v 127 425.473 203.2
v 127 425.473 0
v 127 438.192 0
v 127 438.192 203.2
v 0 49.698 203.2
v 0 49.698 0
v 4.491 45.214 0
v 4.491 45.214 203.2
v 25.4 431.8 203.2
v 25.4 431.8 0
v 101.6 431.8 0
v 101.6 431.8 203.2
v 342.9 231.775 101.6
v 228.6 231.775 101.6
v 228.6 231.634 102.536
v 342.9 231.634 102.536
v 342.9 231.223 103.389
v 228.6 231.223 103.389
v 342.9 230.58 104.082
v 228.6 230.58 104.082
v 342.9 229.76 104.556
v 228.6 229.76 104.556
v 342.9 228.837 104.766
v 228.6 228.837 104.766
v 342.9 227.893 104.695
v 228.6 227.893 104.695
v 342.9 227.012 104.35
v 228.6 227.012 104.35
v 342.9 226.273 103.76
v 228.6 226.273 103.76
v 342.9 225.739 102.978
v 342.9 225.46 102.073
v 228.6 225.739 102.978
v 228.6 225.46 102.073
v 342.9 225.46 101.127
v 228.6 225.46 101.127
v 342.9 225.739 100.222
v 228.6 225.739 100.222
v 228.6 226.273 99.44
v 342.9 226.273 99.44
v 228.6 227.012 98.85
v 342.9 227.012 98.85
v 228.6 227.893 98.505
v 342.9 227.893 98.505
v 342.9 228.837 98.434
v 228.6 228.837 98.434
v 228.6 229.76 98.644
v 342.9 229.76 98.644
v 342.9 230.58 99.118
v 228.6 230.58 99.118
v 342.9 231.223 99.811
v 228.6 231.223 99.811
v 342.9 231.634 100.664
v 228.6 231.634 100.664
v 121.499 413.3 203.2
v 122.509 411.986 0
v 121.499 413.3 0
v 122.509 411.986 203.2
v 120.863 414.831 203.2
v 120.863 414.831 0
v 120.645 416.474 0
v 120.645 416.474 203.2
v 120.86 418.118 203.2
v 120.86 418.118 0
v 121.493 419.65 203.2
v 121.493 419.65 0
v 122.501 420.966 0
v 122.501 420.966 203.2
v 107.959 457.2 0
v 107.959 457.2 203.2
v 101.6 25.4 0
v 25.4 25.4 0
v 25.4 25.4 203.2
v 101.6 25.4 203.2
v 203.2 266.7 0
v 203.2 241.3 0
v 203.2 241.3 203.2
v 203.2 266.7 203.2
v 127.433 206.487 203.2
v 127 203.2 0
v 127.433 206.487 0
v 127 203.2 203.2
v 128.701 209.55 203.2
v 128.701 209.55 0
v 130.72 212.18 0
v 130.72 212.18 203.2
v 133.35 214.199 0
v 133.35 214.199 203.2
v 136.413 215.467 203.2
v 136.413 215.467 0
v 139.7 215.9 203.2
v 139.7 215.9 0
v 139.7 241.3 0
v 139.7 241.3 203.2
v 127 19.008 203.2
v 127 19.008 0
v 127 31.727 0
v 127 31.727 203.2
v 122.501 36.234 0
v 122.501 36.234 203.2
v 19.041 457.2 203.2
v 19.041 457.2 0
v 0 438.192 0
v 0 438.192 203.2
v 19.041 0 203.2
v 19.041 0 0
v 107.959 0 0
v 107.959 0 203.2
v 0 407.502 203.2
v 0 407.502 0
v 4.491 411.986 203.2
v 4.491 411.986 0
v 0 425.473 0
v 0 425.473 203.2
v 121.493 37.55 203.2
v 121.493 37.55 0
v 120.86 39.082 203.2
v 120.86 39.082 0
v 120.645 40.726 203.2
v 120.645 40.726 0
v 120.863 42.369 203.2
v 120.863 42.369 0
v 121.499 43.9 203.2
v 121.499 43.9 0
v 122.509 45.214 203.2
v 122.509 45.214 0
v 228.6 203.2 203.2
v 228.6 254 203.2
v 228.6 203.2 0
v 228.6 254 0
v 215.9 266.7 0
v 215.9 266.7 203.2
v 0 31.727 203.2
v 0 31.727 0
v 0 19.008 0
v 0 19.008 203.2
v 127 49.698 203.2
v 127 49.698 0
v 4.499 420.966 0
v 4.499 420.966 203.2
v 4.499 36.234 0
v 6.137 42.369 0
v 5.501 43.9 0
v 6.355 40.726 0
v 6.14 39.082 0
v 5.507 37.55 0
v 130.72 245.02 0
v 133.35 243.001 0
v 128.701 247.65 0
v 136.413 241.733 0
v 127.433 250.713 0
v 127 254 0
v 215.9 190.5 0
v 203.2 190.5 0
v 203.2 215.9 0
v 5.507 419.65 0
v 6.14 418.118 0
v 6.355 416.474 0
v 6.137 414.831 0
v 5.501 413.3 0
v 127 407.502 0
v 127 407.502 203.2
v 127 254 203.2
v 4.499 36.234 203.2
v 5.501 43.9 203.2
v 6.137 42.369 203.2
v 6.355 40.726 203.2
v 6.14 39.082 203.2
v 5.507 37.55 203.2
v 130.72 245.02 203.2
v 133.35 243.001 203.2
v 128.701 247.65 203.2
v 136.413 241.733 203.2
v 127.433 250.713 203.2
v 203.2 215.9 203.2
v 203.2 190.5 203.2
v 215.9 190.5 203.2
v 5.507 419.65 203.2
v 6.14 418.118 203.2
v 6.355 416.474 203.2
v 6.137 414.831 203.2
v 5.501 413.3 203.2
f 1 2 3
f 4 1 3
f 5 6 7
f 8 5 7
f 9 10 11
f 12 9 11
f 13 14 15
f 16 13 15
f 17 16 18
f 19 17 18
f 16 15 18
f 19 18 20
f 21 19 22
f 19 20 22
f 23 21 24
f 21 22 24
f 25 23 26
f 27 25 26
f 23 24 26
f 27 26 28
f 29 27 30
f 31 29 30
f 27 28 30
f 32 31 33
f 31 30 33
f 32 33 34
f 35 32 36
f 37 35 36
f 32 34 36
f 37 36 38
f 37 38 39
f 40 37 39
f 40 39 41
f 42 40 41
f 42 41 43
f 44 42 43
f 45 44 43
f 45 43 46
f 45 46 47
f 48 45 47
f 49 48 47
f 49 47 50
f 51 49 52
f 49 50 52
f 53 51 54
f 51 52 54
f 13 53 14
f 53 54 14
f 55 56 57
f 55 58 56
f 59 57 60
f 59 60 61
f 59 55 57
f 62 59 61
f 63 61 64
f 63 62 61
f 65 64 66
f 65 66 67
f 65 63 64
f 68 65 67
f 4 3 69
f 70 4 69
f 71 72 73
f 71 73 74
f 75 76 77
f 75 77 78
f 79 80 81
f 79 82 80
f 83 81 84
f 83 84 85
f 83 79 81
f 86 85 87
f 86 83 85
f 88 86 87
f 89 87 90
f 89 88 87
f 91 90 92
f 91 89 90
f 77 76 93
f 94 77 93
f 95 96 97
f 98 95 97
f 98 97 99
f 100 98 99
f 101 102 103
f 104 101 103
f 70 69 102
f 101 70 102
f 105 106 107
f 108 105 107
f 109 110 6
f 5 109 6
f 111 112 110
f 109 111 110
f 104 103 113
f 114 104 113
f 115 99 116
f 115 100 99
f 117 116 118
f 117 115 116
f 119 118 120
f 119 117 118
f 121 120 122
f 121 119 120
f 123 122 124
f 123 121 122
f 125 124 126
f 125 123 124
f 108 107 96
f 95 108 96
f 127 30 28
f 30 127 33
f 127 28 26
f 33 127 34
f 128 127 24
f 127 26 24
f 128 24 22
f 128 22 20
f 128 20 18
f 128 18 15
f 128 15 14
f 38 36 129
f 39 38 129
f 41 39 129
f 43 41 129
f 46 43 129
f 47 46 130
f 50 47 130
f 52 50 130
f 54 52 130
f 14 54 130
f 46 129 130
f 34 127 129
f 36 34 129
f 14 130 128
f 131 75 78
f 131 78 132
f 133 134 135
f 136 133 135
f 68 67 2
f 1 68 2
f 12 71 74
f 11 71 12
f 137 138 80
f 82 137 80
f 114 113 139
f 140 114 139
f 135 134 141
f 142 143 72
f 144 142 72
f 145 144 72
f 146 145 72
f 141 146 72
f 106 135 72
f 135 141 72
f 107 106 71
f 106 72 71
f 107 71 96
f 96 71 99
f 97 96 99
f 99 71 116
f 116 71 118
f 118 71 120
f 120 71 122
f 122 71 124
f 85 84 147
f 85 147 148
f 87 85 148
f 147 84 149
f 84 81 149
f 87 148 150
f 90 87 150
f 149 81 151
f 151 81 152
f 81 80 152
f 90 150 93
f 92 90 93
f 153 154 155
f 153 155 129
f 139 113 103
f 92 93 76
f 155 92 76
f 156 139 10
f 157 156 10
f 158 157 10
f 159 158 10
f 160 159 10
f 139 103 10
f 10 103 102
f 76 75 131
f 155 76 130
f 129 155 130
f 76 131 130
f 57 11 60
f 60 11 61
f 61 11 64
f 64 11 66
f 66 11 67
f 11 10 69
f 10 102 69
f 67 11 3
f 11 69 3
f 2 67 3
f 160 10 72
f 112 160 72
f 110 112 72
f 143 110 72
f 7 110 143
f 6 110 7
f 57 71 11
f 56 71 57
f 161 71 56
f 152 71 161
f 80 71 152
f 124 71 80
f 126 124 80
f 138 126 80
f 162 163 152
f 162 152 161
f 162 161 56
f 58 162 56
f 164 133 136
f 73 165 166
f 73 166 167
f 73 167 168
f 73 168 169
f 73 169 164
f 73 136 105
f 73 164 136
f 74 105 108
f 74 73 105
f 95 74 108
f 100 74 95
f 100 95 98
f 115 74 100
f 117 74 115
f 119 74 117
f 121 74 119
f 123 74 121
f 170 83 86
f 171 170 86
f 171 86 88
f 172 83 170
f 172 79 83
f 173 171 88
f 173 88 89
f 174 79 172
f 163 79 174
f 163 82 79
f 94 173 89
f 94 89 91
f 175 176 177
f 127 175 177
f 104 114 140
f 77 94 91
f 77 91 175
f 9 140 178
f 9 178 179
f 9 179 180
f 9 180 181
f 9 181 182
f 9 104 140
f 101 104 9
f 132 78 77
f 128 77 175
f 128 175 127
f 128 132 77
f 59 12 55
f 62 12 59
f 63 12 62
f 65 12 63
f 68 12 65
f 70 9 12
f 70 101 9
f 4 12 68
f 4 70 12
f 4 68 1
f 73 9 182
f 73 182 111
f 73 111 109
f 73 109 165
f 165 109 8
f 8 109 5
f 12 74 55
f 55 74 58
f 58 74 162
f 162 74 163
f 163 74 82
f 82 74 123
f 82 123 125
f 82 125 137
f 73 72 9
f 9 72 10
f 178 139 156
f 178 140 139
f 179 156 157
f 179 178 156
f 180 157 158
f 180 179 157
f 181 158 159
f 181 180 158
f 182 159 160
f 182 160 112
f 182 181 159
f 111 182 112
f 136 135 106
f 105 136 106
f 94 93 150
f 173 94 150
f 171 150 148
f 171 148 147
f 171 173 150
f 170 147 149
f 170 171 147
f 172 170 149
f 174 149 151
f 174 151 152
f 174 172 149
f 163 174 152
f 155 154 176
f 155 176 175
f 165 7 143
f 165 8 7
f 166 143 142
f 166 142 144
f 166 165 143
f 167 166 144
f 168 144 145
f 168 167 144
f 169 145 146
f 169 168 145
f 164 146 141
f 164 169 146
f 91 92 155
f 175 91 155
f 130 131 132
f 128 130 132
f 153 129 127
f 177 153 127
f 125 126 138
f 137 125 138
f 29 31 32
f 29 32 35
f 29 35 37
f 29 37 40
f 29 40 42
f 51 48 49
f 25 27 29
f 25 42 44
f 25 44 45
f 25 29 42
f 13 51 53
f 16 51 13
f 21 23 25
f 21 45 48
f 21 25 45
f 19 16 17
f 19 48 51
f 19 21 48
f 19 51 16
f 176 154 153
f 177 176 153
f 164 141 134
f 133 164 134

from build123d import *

# Parameters (mm, degrees)
F0_W     = 76.2
F0_H     = 406.4
F0_W_2   = 25.4
F0_H_2   = 25.4
F1_DEPTH = 203.2
F2_R     = 6.35
F3_R     = 12.7
F4_SIZE  = 12.7
F5_R     = 3.175
F6_DEPTH = 114.3


with BuildPart() as f1:
    # F0 (on Top) → F1 (new body)
    with BuildSketch(Plane.XY):
        Polygon((0, 19.00799), (19.040657, 0), (107.959343, 0), (127, 19.00799), (127, 31.727383), (118.014842, 40.727982), (127, 49.697725), (127, 215.9), (203.2, 215.9), (228.6, 215.9), (228.6, 241.3), (203.2, 241.3), (127, 241.3), (127, 407.502275), (118.014842, 416.472018), (127, 425.472617), (127, 438.19201), (107.959343, 457.2), (19.040657, 457.2), (0, 438.19201), (0, 425.472617), (8.985158, 416.472018), (0, 407.502275), (0, 49.697725), (8.985158, 40.727982), (0, 31.727383), align=None)
        with Locations((63.5, 228.6)):
            Rectangle(F0_W, F0_H, mode=Mode.SUBTRACT)
        with Locations((215.9, 203.2)):
            Rectangle(F0_W_2, F0_H_2)
        with Locations((215.9, 254)):
            Rectangle(F0_W_2, F0_H_2)
    extrude(amount=F1_DEPTH)

    # F2
    f2_edges = [f1.edges().sort_by_distance(p)[0] for p in [
        (118.014842, 416.472018, 101.6),
        (8.985158, 416.472018, 101.6),
        (8.985158, 40.727982, 101.6),
        (118.014842, 40.727982, 101.6),
    ]]
    fillet(f2_edges, radius=F2_R)

    # F3
    f3_edges = [f1.edges().sort_by_distance(p)[0] for p in [
        (127, 215.9, 101.6),
        (127, 241.3, 101.6),
    ]]
    fillet(f3_edges, radius=F3_R)

    # F4
    f4_edges = [f1.edges().sort_by_distance(p)[0] for p in [
        (228.6, 190.5, 101.6),
        (228.6, 266.7, 101.6),
    ]]
    chamfer(f4_edges, length=F4_SIZE)

    # F5 (on face) → F6 (join)
    with BuildSketch(Plane.YZ.offset(228.6)):
        with Locations((228.6, 101.6)):
            Circle(F5_R)
    extrude(amount=F6_DEPTH)


solid = f1.part
